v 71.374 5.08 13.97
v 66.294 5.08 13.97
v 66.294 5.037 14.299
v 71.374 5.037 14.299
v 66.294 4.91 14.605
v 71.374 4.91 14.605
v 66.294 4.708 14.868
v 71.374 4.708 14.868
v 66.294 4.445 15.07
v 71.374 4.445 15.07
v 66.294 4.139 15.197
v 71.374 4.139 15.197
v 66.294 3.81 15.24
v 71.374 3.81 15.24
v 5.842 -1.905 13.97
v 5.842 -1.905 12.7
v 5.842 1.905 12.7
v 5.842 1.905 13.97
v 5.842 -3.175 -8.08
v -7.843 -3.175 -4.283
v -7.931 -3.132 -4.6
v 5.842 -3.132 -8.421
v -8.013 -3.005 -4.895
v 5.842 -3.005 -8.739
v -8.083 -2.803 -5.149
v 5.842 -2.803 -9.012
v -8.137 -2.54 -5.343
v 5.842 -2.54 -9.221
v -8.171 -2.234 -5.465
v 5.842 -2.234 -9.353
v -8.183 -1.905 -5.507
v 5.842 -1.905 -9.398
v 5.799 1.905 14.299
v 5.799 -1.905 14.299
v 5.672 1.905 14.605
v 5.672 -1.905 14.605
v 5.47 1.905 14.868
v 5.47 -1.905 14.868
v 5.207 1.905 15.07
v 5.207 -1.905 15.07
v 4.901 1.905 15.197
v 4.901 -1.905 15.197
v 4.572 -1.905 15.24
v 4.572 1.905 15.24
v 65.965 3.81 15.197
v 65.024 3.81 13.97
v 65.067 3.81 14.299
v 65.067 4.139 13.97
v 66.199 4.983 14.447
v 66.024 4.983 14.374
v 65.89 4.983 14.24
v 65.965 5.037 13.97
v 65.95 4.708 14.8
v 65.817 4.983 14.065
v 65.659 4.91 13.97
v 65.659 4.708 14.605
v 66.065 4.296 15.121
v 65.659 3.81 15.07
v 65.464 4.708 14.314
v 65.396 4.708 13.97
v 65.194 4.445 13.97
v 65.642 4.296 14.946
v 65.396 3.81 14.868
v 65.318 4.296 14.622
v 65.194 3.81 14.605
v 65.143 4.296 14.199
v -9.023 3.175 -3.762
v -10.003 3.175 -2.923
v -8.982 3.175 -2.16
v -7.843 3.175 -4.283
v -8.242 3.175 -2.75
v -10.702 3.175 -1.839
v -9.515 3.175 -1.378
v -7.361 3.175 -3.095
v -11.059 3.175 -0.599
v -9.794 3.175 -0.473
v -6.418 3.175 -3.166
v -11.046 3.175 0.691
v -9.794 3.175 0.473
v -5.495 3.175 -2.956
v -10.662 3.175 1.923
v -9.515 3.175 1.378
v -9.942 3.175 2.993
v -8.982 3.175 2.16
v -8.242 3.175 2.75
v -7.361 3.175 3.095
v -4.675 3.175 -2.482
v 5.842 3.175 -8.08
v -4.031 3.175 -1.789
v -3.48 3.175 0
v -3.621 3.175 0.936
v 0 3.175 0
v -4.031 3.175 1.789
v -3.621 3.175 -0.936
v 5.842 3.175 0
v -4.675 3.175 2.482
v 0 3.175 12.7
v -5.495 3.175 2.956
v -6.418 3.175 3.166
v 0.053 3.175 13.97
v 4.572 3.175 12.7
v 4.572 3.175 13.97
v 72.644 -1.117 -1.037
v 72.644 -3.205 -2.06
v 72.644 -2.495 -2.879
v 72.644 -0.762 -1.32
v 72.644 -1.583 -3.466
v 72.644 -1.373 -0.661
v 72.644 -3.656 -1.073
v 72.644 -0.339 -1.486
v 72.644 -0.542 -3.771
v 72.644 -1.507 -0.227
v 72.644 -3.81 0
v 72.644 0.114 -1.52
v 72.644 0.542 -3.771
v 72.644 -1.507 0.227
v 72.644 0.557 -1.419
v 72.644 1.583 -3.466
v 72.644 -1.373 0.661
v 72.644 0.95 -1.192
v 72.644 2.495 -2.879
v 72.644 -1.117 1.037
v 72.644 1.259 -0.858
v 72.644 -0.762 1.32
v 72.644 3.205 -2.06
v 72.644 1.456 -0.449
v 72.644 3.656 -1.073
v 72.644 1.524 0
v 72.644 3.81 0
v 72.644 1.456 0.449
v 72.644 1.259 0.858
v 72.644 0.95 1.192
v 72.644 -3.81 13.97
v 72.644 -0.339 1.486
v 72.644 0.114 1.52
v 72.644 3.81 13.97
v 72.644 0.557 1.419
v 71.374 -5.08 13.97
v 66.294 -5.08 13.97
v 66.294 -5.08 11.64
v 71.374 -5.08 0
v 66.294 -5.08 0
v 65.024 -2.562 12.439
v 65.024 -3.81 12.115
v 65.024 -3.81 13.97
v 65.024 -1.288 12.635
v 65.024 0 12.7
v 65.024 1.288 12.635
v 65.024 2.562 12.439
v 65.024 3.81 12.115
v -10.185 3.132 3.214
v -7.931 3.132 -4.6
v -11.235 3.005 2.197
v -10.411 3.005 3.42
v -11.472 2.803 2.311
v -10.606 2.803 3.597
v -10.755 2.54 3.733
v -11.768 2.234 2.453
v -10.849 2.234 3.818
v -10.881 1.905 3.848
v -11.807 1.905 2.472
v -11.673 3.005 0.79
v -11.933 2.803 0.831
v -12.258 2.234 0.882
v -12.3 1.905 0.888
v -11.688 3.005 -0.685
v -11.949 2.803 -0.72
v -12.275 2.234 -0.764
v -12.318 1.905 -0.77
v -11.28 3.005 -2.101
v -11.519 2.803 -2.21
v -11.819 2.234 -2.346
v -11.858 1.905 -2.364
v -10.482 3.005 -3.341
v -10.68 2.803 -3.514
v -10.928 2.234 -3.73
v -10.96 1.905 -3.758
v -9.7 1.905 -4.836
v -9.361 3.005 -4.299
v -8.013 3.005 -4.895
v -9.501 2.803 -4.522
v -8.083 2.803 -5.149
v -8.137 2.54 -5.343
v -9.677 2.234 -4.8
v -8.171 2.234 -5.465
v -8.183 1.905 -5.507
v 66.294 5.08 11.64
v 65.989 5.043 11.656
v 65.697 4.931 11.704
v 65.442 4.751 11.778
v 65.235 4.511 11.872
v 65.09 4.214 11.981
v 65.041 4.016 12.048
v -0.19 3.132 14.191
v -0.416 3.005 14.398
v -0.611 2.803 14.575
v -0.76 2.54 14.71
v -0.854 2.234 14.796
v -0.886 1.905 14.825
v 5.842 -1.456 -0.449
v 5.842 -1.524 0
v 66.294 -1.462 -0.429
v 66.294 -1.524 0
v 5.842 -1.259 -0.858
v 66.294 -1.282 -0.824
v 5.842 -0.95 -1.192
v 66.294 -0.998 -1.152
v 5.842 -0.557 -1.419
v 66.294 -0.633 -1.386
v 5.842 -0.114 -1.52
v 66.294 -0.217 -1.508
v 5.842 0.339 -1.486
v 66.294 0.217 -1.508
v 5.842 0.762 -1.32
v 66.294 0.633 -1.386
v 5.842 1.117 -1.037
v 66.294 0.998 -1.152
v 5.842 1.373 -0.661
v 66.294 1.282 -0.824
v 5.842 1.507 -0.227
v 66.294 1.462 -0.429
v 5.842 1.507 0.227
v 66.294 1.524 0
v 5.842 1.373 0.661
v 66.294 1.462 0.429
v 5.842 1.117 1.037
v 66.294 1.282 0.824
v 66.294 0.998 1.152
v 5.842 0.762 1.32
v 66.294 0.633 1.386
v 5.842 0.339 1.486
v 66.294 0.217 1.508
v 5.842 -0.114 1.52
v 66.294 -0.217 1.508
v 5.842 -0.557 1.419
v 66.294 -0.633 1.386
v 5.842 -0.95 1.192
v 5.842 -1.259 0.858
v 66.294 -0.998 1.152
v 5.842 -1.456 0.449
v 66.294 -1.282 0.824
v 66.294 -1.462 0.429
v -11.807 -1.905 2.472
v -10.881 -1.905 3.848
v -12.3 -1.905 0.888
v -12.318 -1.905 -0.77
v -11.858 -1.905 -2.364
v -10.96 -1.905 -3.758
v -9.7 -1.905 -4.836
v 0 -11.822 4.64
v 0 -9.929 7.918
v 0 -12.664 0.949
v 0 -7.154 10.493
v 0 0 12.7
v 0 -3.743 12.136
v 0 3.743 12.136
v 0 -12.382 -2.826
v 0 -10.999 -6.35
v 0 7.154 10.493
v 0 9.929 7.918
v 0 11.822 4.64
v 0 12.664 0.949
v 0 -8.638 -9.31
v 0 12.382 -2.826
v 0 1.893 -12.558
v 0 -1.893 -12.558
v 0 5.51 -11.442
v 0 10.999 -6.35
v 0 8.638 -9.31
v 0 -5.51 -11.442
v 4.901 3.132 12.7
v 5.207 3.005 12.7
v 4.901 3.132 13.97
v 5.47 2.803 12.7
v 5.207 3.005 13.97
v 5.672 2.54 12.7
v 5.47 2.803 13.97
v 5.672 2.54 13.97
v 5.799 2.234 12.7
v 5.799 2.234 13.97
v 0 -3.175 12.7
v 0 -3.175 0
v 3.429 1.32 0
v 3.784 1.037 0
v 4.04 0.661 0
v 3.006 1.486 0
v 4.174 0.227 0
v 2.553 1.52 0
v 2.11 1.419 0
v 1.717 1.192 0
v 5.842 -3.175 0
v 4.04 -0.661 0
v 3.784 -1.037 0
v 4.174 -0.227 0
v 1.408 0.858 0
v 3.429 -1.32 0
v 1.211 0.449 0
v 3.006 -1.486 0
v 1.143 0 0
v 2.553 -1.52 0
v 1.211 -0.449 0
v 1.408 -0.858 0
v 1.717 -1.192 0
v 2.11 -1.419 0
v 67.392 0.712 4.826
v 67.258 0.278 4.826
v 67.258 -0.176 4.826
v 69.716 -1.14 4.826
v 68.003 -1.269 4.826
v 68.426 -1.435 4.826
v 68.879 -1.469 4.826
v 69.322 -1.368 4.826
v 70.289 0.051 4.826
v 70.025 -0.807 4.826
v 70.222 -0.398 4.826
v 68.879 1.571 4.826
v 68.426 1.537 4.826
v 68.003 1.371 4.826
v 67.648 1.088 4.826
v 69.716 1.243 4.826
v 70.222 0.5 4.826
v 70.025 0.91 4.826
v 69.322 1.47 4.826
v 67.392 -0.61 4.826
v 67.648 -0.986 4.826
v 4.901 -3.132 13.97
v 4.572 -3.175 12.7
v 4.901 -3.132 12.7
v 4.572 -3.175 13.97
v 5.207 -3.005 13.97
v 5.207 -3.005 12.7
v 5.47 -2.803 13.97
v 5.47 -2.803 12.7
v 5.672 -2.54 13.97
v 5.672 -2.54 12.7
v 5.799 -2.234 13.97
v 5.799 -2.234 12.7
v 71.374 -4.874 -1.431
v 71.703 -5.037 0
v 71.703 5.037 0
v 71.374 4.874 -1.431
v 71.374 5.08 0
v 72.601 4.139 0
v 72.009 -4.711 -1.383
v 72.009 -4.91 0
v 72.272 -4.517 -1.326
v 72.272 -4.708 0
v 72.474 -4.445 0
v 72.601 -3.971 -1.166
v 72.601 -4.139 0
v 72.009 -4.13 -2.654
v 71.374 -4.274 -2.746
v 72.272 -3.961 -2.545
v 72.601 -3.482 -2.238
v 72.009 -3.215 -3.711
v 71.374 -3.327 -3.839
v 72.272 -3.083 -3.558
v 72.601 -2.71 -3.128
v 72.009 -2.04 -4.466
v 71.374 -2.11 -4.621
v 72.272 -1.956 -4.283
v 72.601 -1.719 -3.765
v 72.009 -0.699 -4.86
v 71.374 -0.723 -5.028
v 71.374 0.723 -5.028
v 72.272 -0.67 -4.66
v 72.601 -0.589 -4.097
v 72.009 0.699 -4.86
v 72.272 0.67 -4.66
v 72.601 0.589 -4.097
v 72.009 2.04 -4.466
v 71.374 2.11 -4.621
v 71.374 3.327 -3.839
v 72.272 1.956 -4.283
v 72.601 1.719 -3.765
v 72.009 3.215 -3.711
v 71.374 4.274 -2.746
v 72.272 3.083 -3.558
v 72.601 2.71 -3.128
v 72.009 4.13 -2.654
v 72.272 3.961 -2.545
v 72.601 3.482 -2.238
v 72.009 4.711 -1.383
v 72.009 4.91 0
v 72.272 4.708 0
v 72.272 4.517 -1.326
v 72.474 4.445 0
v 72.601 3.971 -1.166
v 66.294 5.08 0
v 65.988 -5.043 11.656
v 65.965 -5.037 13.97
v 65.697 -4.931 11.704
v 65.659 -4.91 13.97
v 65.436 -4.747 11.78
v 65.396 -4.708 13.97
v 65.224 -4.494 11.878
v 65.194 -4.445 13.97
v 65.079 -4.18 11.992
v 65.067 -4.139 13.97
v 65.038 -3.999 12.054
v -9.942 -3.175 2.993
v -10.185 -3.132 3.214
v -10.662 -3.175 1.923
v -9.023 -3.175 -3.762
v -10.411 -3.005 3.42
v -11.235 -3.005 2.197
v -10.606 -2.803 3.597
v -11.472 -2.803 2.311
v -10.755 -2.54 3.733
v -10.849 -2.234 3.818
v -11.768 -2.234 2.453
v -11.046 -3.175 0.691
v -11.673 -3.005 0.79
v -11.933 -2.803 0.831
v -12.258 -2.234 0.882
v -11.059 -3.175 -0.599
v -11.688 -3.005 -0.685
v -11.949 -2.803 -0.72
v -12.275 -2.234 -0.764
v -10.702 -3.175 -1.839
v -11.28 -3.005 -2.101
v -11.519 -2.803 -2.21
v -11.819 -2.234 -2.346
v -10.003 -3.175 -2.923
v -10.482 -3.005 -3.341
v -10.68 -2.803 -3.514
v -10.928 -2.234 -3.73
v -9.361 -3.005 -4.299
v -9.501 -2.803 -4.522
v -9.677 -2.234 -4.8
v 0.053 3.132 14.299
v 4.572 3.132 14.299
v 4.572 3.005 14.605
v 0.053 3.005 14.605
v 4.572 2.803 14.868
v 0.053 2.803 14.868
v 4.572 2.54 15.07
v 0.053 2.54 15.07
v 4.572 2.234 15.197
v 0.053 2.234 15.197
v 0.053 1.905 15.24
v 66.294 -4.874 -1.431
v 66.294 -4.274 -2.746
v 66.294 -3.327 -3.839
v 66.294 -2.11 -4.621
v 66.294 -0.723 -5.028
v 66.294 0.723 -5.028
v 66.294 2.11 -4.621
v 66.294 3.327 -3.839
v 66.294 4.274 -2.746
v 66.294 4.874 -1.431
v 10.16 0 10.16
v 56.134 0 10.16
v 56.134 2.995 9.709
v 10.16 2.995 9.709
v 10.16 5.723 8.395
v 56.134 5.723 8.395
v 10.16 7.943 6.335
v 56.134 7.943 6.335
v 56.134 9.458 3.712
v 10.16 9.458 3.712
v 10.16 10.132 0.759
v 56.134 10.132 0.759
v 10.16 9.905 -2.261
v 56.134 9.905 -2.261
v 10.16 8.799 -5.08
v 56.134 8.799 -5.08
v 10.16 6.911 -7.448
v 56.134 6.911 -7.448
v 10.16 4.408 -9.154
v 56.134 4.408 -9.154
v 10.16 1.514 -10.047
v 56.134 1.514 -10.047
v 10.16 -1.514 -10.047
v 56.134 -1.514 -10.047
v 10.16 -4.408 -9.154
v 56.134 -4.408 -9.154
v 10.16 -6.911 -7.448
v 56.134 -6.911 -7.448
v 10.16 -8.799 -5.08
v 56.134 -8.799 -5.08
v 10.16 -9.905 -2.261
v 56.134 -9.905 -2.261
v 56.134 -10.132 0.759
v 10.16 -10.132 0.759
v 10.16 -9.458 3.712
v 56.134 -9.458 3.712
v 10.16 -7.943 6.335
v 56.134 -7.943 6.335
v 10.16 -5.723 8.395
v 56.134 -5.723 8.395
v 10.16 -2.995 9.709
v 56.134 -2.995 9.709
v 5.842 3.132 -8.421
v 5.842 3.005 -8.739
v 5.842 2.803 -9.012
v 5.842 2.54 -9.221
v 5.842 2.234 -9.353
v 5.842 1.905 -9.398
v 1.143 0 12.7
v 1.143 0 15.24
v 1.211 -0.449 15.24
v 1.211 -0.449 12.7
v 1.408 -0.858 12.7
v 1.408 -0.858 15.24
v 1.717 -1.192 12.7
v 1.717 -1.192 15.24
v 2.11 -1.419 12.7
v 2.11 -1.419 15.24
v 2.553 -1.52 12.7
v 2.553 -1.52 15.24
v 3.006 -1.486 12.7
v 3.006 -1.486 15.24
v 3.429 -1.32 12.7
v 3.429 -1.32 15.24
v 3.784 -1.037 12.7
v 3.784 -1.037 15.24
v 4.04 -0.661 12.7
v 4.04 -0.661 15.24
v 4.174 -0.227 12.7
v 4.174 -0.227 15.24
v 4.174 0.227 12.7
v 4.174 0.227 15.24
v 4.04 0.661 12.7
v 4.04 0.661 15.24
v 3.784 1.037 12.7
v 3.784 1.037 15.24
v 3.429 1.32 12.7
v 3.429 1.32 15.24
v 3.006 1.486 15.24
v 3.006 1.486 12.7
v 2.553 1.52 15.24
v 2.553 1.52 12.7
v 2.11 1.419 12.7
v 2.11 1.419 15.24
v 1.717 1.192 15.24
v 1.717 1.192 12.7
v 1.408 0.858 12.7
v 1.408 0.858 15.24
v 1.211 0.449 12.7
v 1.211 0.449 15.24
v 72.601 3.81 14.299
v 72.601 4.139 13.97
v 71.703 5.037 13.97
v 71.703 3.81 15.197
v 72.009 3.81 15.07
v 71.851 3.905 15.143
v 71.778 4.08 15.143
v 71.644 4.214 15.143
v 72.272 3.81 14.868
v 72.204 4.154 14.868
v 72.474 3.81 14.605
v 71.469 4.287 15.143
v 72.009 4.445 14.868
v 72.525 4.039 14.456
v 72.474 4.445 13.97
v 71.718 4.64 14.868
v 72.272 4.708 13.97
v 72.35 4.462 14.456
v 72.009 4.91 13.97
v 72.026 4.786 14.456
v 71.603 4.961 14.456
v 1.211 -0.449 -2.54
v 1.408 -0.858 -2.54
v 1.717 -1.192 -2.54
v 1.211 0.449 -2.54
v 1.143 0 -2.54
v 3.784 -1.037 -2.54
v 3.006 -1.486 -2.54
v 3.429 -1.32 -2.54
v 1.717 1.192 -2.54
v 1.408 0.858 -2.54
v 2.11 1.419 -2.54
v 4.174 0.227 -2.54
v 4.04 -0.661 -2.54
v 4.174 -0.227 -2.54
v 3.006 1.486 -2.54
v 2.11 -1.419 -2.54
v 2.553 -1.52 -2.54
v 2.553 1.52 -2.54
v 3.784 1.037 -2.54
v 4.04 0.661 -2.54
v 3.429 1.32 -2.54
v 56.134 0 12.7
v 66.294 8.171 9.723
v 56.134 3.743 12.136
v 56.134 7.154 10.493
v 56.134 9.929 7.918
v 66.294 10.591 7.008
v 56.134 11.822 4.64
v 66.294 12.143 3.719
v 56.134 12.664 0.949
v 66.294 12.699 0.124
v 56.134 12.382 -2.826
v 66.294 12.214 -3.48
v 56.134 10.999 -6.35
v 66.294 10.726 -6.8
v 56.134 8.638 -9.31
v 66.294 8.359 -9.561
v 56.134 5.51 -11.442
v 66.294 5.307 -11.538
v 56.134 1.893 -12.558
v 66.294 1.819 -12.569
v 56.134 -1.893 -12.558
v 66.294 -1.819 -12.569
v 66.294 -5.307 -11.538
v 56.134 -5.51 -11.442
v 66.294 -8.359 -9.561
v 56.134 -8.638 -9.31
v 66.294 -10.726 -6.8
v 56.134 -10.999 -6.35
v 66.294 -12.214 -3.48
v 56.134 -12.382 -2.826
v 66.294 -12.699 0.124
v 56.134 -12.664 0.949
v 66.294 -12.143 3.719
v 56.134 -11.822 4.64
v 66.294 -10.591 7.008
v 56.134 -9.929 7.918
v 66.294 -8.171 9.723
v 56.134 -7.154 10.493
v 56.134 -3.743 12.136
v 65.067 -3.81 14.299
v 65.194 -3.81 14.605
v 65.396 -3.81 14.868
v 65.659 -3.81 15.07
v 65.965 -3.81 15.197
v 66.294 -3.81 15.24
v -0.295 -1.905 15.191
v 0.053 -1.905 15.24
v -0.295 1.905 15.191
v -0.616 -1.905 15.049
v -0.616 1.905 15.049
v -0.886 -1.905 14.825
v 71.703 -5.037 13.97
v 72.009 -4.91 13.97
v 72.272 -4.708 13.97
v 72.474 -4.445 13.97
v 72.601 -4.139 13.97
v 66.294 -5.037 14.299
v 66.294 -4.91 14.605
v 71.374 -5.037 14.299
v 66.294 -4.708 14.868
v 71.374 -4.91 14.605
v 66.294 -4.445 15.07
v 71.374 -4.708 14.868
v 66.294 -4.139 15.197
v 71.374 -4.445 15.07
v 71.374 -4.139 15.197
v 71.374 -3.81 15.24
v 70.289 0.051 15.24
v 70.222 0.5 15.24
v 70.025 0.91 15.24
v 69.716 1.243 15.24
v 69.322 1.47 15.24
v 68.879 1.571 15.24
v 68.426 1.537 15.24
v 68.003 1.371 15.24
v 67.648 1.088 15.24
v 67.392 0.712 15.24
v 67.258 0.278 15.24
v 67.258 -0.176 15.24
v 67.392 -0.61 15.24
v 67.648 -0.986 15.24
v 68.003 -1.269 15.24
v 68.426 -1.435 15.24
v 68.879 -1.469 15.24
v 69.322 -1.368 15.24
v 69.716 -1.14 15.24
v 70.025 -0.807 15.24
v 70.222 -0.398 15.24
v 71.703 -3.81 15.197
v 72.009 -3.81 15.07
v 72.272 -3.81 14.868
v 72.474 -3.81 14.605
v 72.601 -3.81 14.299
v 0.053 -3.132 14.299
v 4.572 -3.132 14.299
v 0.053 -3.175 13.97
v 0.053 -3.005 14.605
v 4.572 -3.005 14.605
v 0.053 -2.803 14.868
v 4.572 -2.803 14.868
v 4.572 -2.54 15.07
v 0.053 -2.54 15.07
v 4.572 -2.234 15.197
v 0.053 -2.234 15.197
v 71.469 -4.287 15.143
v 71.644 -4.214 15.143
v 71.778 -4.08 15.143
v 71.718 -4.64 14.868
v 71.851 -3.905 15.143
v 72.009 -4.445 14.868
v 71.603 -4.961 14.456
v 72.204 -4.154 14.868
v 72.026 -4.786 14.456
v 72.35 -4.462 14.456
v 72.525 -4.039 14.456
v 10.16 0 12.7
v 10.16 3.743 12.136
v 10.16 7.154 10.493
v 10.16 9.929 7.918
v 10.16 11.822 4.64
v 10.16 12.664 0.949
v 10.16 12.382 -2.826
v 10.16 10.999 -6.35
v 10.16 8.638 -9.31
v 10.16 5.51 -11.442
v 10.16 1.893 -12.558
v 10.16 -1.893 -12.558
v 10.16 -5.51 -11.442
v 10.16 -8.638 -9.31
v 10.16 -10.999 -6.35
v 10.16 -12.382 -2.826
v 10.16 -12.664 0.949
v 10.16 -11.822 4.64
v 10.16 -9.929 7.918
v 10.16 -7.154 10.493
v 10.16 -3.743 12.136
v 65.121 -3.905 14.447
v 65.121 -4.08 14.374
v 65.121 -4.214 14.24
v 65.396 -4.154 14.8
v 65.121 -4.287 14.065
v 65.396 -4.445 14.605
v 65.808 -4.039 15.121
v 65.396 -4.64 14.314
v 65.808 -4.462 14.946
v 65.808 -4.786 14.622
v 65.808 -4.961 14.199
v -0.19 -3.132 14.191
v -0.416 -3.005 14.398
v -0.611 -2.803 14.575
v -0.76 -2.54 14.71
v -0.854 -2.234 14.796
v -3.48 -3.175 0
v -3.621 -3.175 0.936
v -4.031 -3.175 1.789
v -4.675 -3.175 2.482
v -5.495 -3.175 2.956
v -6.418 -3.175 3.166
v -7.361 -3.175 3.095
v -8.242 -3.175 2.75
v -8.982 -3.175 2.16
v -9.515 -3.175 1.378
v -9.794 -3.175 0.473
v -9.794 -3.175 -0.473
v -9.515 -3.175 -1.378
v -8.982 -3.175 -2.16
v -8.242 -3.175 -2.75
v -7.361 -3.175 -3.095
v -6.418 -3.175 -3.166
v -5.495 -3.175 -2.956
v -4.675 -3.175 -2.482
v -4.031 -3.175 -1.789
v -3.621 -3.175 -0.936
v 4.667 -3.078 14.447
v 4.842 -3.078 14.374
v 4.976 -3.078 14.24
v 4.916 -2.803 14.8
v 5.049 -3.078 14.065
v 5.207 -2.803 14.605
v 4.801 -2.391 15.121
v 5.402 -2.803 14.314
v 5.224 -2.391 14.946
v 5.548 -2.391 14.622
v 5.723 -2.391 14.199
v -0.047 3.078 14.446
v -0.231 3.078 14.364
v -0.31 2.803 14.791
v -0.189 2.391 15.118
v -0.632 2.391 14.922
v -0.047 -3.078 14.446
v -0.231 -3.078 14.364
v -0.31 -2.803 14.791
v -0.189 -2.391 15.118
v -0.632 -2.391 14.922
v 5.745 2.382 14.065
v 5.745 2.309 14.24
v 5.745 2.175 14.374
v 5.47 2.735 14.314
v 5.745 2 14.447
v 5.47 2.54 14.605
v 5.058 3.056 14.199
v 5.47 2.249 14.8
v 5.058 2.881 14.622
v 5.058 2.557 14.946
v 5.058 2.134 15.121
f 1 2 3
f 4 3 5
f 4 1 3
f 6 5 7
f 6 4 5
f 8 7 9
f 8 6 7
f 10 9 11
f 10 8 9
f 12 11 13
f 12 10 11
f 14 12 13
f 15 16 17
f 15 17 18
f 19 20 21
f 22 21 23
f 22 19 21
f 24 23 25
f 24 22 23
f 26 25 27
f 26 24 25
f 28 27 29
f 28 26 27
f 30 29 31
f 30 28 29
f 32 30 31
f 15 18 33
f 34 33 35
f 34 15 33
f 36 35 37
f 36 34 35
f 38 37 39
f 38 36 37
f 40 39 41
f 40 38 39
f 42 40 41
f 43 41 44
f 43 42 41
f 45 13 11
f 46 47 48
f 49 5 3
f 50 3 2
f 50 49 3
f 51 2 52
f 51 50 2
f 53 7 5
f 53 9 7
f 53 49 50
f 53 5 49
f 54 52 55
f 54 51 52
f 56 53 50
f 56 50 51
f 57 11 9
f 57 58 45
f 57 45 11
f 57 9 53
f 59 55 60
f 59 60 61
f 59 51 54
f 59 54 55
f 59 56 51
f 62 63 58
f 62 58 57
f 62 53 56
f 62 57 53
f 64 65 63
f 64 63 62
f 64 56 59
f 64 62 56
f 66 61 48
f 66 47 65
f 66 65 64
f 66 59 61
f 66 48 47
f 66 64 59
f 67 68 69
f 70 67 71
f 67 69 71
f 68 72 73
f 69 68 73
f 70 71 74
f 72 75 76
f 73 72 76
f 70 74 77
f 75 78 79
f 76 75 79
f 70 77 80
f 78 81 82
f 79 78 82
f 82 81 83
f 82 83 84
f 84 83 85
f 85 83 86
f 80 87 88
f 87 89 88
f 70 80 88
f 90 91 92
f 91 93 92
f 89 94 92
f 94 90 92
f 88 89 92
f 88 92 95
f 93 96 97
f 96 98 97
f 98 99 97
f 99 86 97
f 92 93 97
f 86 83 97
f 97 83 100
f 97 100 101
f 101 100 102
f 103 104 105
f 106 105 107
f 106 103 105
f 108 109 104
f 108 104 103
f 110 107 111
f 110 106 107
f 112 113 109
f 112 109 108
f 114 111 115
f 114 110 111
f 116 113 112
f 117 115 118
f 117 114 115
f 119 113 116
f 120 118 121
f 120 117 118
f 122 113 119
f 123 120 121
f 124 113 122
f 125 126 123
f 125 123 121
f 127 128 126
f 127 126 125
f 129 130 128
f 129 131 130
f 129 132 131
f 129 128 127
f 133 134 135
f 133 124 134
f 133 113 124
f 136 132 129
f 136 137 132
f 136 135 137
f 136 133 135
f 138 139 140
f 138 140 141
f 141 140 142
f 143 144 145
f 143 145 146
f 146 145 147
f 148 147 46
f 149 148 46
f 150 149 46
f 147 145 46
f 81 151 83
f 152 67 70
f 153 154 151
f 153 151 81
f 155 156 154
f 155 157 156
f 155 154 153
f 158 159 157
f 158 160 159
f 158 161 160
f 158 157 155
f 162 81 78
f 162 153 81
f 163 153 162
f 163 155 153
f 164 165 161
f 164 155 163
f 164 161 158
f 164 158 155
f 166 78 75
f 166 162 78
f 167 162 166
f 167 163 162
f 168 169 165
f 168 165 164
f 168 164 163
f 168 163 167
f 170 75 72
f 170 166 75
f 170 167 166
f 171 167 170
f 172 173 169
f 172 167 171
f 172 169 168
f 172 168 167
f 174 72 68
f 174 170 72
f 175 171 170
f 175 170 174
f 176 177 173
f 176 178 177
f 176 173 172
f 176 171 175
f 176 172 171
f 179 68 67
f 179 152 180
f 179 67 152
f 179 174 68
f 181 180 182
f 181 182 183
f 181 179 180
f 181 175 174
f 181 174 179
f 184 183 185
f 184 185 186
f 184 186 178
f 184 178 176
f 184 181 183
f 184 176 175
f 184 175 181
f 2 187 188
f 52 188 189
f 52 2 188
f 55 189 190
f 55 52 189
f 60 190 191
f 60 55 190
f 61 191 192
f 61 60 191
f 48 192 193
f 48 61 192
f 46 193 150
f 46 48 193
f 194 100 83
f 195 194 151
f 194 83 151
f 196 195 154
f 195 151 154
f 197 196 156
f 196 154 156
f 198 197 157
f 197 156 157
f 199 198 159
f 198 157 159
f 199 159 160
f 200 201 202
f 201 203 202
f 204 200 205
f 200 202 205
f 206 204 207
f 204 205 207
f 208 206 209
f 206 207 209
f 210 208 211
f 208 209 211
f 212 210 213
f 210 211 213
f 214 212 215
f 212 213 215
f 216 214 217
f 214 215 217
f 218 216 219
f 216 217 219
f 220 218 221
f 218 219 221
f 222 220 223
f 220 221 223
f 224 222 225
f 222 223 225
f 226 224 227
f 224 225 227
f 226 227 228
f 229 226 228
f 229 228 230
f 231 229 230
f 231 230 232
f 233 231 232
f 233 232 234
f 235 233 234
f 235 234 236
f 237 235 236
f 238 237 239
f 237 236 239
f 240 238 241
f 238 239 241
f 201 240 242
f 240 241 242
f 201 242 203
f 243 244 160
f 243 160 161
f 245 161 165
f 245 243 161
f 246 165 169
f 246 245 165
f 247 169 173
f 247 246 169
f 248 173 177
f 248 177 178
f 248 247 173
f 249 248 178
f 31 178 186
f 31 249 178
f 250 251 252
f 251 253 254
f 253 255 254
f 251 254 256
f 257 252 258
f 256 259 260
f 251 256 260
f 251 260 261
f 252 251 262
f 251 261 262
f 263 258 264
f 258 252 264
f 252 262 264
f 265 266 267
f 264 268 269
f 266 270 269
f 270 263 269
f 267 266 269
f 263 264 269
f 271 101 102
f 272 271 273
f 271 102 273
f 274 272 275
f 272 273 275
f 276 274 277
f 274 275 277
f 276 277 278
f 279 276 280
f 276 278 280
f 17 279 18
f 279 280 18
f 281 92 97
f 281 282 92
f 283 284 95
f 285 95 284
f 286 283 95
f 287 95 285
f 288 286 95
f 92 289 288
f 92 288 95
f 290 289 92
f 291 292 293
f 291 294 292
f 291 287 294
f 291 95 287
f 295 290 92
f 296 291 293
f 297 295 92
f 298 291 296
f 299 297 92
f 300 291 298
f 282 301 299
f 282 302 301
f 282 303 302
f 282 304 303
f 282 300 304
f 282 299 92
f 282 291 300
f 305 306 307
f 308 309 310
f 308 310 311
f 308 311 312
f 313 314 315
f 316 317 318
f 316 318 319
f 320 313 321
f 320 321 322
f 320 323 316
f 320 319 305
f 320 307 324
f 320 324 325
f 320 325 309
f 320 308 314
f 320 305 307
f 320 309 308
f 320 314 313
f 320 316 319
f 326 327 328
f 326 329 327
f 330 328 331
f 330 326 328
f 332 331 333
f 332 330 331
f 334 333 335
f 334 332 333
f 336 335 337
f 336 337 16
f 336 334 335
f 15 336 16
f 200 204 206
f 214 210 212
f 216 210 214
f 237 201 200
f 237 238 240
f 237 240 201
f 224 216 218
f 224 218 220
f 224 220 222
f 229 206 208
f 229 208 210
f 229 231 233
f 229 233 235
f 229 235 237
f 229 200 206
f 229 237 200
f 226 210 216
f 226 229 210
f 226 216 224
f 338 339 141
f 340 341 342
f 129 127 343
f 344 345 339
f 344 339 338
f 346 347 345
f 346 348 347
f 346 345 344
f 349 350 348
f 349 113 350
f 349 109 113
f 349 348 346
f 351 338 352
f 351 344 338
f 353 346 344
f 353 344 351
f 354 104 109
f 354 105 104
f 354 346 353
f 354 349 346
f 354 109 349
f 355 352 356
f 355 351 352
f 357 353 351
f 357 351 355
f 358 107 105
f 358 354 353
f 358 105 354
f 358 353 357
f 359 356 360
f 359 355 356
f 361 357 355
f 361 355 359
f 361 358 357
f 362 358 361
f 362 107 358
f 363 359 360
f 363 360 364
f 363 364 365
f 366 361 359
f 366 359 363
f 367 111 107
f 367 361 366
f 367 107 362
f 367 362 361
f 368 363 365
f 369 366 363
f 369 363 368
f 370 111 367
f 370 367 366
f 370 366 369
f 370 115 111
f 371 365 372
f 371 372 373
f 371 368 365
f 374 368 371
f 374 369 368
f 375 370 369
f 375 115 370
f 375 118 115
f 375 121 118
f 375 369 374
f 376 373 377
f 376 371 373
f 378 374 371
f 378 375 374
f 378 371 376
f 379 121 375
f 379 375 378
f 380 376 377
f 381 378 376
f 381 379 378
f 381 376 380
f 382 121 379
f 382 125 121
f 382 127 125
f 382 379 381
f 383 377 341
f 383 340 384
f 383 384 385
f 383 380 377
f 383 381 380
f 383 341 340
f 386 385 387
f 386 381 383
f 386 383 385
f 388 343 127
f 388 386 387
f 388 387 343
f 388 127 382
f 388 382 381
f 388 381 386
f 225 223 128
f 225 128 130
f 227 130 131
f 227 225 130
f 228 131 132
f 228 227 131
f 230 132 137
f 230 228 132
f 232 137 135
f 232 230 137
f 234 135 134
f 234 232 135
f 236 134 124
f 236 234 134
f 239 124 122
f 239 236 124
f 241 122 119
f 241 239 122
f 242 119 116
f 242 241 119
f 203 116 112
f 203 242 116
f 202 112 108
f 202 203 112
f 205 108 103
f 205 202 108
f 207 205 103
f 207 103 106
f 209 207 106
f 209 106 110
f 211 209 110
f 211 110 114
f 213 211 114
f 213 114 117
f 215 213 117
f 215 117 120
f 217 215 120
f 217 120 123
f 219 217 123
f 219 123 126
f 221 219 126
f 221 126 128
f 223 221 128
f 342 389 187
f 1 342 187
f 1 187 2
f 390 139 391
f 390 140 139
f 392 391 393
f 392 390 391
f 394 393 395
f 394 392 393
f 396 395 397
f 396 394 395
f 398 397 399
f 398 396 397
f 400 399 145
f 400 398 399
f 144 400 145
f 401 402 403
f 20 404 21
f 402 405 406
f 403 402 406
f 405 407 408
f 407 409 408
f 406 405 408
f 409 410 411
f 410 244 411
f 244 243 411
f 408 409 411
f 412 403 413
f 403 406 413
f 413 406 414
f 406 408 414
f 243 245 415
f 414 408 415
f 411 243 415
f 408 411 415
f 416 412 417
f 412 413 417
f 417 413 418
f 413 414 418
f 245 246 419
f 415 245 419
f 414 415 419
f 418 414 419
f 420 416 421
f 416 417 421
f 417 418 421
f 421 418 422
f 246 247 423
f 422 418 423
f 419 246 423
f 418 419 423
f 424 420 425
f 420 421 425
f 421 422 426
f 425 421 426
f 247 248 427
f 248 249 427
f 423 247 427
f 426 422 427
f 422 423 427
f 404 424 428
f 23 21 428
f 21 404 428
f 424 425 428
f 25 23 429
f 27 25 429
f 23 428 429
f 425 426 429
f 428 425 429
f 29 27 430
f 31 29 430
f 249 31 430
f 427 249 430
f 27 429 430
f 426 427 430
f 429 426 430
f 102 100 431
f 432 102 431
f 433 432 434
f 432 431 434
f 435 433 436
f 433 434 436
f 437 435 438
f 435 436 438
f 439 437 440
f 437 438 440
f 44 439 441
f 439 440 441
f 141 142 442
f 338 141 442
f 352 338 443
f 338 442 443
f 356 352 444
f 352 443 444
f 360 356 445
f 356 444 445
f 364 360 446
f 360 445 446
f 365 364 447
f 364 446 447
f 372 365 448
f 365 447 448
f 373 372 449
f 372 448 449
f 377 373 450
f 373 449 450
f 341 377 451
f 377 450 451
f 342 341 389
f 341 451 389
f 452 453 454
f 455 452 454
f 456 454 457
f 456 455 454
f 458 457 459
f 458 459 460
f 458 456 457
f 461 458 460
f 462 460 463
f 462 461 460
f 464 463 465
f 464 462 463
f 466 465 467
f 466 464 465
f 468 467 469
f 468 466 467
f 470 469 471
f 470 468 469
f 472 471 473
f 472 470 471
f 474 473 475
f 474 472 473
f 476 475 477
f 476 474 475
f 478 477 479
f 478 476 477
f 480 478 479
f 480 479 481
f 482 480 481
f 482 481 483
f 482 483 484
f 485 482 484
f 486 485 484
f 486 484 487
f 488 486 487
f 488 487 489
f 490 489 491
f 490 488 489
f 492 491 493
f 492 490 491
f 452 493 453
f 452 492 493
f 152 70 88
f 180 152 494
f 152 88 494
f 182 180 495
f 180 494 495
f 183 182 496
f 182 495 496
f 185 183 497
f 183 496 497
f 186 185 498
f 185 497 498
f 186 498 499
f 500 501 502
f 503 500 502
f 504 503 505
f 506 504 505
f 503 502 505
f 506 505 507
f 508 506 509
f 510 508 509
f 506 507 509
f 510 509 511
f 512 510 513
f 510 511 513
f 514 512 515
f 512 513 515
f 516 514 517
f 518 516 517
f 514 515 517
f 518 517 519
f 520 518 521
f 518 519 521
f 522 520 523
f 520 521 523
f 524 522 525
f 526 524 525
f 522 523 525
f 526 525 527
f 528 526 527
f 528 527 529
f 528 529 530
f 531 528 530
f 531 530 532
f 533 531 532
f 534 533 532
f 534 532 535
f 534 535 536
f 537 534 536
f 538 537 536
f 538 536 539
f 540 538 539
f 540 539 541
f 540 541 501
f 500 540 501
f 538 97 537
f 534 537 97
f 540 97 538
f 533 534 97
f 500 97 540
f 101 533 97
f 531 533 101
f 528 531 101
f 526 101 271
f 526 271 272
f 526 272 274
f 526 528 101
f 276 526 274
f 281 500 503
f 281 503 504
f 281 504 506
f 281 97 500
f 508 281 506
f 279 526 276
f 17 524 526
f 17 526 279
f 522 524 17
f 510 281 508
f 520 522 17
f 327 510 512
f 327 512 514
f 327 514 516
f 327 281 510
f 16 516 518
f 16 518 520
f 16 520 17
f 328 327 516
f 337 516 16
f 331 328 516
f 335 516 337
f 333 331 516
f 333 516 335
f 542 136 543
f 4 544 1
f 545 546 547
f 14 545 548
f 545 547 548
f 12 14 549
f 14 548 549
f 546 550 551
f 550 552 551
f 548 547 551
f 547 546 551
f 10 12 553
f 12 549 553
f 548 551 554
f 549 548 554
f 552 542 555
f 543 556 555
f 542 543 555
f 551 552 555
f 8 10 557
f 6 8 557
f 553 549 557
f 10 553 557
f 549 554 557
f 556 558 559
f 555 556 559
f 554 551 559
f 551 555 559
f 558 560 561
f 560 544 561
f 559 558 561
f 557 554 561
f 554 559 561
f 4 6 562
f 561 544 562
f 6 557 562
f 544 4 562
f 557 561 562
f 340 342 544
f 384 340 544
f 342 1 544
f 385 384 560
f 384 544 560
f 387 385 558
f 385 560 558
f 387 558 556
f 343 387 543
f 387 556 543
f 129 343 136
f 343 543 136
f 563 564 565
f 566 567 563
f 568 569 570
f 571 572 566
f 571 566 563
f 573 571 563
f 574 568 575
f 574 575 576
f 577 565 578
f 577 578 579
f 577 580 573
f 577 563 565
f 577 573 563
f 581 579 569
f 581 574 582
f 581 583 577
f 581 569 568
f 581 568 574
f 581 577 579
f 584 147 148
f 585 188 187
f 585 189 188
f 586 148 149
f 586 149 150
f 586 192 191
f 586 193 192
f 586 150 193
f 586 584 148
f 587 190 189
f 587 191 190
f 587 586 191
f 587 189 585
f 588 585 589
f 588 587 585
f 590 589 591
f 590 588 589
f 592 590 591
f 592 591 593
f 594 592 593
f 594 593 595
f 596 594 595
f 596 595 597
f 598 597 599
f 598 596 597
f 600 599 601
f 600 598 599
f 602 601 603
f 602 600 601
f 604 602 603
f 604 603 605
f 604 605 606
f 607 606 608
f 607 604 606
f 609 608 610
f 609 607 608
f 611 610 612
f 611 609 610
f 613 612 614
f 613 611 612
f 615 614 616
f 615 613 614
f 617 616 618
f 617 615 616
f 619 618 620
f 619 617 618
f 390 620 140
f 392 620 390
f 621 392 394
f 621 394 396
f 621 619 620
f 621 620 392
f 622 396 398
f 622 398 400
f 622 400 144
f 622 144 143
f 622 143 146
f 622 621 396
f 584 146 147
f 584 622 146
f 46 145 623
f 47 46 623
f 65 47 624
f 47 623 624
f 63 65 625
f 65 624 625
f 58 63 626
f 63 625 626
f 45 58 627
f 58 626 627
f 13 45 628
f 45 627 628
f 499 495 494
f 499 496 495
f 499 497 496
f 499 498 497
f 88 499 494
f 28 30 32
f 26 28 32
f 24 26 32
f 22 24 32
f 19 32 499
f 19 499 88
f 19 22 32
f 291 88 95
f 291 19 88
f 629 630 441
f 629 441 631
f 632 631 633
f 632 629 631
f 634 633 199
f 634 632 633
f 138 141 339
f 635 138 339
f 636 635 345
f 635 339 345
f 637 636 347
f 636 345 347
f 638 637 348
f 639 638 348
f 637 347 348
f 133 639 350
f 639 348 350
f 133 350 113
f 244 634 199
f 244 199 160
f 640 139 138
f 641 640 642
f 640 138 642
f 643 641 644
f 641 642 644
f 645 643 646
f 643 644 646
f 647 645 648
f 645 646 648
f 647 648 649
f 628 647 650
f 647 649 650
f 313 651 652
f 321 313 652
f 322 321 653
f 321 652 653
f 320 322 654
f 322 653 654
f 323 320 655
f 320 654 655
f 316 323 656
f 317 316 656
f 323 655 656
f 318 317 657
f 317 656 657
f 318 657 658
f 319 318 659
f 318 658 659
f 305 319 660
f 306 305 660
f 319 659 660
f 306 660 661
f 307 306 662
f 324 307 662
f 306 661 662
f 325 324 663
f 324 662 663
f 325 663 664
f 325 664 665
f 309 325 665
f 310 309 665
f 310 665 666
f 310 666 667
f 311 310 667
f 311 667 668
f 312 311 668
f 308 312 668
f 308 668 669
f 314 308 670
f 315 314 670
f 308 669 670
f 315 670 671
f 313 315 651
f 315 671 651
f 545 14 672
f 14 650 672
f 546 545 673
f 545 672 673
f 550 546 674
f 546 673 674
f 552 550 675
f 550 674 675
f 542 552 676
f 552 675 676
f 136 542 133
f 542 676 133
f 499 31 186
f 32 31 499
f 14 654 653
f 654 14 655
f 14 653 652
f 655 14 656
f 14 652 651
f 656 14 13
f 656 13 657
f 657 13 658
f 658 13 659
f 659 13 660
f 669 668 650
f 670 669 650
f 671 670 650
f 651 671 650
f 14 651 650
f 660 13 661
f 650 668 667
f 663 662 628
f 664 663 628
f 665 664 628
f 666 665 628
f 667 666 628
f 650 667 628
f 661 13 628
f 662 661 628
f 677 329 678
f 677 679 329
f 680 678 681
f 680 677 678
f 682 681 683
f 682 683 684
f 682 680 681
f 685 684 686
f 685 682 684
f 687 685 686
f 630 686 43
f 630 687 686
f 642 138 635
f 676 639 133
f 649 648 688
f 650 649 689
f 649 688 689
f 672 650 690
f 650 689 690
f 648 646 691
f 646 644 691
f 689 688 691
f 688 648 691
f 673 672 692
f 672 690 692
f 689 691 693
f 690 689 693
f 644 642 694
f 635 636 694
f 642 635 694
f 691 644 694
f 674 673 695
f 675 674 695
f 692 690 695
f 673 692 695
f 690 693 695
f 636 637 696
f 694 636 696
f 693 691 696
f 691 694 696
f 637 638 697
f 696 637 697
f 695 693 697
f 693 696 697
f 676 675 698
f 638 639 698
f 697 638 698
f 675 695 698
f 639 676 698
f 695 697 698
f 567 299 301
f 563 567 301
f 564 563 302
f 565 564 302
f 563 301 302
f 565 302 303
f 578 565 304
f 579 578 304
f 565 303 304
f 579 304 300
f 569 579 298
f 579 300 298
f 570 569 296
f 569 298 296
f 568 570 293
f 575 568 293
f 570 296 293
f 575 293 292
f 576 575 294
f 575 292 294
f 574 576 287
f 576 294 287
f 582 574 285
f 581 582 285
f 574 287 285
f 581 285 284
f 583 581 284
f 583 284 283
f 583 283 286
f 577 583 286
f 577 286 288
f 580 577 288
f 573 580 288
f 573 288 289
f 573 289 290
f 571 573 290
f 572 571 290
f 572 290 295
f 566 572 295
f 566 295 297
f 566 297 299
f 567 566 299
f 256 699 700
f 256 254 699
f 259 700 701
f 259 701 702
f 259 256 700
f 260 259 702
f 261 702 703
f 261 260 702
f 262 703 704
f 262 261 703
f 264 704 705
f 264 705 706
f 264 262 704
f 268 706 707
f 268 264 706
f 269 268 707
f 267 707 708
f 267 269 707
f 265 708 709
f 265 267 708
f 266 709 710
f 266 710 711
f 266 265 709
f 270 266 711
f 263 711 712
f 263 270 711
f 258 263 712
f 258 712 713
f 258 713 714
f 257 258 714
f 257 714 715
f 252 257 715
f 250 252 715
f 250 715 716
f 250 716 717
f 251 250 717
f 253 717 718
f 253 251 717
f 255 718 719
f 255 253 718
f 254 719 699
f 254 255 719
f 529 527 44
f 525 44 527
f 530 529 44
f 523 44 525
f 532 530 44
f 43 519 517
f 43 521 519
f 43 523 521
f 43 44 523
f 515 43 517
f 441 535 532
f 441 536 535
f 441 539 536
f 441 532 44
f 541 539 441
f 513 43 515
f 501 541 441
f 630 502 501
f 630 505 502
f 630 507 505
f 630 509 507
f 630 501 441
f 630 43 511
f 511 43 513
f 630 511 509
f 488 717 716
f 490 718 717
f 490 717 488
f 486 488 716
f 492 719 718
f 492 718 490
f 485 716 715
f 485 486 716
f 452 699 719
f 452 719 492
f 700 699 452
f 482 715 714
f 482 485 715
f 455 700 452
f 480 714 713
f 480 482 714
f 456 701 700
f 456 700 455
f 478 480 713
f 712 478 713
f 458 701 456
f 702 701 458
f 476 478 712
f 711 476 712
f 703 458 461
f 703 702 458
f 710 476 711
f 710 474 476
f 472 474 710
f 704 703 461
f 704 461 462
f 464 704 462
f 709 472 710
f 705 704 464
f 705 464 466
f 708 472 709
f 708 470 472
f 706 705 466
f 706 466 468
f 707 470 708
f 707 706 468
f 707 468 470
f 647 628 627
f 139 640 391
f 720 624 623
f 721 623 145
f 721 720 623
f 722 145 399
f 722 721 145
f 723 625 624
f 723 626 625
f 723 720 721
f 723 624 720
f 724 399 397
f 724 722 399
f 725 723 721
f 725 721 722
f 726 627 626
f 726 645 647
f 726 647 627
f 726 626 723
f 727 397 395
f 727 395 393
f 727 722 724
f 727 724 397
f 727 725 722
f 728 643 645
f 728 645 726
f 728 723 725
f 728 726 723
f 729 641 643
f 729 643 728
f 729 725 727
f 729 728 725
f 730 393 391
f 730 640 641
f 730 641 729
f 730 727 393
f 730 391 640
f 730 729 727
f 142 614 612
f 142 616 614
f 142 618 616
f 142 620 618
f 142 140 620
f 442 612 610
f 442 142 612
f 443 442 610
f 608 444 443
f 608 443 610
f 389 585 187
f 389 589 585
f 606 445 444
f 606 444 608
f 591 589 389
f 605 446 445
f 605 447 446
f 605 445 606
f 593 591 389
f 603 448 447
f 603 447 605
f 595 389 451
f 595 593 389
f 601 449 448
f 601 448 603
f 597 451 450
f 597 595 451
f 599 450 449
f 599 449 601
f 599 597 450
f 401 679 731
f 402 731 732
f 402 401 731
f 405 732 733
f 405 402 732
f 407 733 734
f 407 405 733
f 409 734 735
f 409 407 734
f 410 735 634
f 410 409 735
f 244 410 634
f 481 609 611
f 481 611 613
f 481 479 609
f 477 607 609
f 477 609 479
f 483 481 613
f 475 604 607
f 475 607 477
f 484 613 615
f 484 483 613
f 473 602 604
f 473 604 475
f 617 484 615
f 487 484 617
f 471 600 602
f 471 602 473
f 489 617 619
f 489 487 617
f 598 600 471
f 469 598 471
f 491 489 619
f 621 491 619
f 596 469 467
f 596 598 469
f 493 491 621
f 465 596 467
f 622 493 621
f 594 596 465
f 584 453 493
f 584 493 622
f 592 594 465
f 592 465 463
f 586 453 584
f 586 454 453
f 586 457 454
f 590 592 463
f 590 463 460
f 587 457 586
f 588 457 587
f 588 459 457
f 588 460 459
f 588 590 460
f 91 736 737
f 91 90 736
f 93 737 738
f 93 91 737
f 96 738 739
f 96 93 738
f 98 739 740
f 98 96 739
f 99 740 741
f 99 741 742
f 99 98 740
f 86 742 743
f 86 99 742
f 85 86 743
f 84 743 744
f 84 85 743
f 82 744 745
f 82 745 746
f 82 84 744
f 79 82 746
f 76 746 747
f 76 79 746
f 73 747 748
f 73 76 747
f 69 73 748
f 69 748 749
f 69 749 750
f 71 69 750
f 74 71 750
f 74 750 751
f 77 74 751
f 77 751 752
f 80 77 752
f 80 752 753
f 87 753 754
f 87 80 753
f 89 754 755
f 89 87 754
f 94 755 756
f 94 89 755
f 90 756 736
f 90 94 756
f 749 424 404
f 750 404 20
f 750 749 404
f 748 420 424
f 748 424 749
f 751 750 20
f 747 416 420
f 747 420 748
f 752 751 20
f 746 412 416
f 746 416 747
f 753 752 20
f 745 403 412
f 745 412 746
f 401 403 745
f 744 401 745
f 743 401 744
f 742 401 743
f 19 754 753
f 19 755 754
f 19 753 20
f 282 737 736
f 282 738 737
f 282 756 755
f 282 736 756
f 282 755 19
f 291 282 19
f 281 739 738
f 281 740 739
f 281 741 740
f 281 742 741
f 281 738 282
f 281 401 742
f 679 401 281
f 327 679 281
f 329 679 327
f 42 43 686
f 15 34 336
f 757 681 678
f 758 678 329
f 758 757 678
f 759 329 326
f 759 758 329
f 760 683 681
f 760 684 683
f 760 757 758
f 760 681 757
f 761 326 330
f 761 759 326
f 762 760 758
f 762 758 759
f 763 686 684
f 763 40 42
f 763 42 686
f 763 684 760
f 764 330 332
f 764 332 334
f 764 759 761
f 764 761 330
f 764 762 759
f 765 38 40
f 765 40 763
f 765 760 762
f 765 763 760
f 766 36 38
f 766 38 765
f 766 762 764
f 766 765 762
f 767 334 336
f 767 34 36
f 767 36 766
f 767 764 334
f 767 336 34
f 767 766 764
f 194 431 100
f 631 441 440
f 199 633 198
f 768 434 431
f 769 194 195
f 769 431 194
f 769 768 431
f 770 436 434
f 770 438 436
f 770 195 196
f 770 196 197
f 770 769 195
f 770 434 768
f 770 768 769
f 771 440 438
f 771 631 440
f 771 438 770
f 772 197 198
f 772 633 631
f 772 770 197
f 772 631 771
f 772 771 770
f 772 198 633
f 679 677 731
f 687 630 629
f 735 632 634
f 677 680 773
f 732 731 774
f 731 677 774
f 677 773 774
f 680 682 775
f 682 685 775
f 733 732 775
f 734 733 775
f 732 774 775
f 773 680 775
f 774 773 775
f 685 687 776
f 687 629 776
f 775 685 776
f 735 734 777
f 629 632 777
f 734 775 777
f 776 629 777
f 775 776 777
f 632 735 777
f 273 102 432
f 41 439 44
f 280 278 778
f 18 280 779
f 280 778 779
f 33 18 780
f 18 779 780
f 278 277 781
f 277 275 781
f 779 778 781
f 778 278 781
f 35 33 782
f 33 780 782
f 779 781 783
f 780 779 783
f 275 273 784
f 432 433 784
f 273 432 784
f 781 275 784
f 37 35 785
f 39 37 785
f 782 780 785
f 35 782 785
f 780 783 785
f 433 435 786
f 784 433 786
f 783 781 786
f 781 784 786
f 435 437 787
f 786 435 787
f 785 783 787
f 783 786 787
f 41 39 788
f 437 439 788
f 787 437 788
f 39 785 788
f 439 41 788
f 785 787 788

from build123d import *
from build123d import SkipClean  # not in build123d's __all__

# Parameters (mm, degrees)
F0_W      = 5.842
F0_H      = 12.7
F0_R      = 3.175
F2_DEPTH  = 3.175
F4_DEPTH  = 60.452
F5_R      = 1.524
F6_DEPTH  = 1.27
F7_DEPTH  = 6.35
F10_DEPTH = 17.78
F11_R     = 1.524
F12_DEPTH = 10.414
F13_R     = 1.27
F14_R     = 1.27


# Not quite as in the source:
# - after a boolean that leaves OpenCascade's solid faulty, fix() repairs it


with BuildPart() as f1:
    # F0 (on Front) → F1 (revolve)
    with BuildSketch(Plane.XZ):
        Polygon((5.842, 12.7), (5.842, 0), (66.294, 0), (66.294, 12.7), (56.134, 12.7), (56.134, 10.16), (10.16, 10.16), (10.16, 12.7), align=None)
        with Locations((2.921, 6.35)):
            Rectangle(F0_W, F0_H)
    revolve(axis=Axis((33.147, 0, 0), (-1, 0, 0)))

    # F3 (on face) → F4 (cut)
    with BuildSketch(Plane.YZ.offset(66.294)):
        with BuildLine():
            Line((-1.524, 0), (1.524, 0))
            ThreePointArc((1.524, 0), (0, 1.524), (-1.524, 0))
        make_face()
        with BuildLine():
            ThreePointArc((-1.524, 0), (0, -1.524), (1.524, 0))
            Line((1.524, 0), (-1.524, 0))
        make_face()
    extrude(amount=-F4_DEPTH, mode=Mode.SUBTRACT)

    # F5 (on face) → F6 (join)
    with BuildSketch(Plane.YZ.offset(66.294)):
        with BuildLine():
            ThreePointArc((-5.08, 0), (0, 5.08), (5.08, 0))
            Line((5.08, 0), (5.08, 11.6397422652))
            ThreePointArc((5.08, 11.6397422652), (0, 12.7), (-5.08, 11.6397422652))
            Line((-5.08, 11.6397422652), (-5.08, 0))
        make_face()
        with BuildLine():
            ThreePointArc((-5.08, 11.6397422652), (0, 12.7), (5.08, 11.6397422652))
            Line((5.08, 11.6397422652), (5.08, 15.24))
            Line((5.08, 15.24), (-5.08, 15.24))
            Line((-5.08, 15.24), (-5.08, 11.6397422652))
        make_face()
        with BuildLine():
            ThreePointArc((-5.08, 0), (0, -5.08), (5.08, 0))
            ThreePointArc((5.08, 0), (0, 5.08), (-5.08, 0))
        make_face()
        Circle(F5_R, mode=Mode.SUBTRACT)
    extrude(amount=-F6_DEPTH)

    # F5 (on face) → F7 (join)
    with BuildSketch(Plane.YZ.offset(66.294)):
        with BuildLine():
            ThreePointArc((-5.08, 0), (0, 5.08), (5.08, 0))
            Line((5.08, 0), (5.08, 11.6397422652))
            ThreePointArc((5.08, 11.6397422652), (0, 12.7), (-5.08, 11.6397422652))
            Line((-5.08, 11.6397422652), (-5.08, 0))
        make_face()
        with BuildLine():
            ThreePointArc((-5.08, 11.6397422652), (0, 12.7), (5.08, 11.6397422652))
            Line((5.08, 11.6397422652), (5.08, 15.24))
            Line((5.08, 15.24), (-5.08, 15.24))
            Line((-5.08, 15.24), (-5.08, 11.6397422652))
        make_face()
        with BuildLine():
            ThreePointArc((-5.08, 0), (0, -5.08), (5.08, 0))
            ThreePointArc((5.08, 0), (0, 5.08), (-5.08, 0))
        make_face()
        Circle(F5_R, mode=Mode.SUBTRACT)
    with SkipClean():  # cleaning this boolean's faces spoils the solid; the shape is the same uncleaned
        extrude(amount=F7_DEPTH)

    # F11 (on face) → F12 (cut)
    with BuildSketch(Plane.XY.offset(15.24)):
        with Locations((68.7653996064, 0.0510123878)):
            Circle(F11_R)
    extrude(amount=-F12_DEPTH, mode=Mode.SUBTRACT)

    add(f1.part.fix(), mode=Mode.REPLACE)

    # F13
    f13_edges = [f1.edges().sort_by_distance(p)[0] for p in [
        (72.644, -5.08, 7.62),
        (68.834, -5.08, 15.24),
        (72.644, 0, 15.24),
        (65.024, 0, 15.24),
        (68.834, 5.08, 15.24),
        (65.024, -5.08, 13.439871),
        (65.024, 5.08, 13.439871),
    ]]
    fillet(f13_edges, radius=F13_R)


with BuildPart() as f2:
    # F0 (on Front) → F2 (new body, symmetric)
    with BuildSketch(Plane.XZ):
        with BuildLine():
            Line((-0.9398, 0), (0, 0))
            Line((0, 0), (0, 12.7))
            Line((0, 12.7), (5.842, 12.7))
            Line((5.842, 12.7), (5.842, 15.24))
            Line((5.842, 15.24), (-0.508, 15.24))
            Line((-0.508, 15.24), (-10.8806298187, 3.8475430269))
            ThreePointArc((-10.8806298187, 3.8475430269), (-4.5919612295, 5.3297205562), (-0.9398, 0))
        make_face()
        with BuildLine():
            ThreePointArc((-8.1826630726, -5.5069827884), (-3.1957909266, -4.5493385486), (-0.9398, 0))
            ThreePointArc((-0.9398, 0), (-4.5919612295, 5.3297205562), (-10.8806298187, 3.8475430269))
            ThreePointArc((-10.8806298187, 3.8475430269), (-12.1459778134, -1.5837270034), (-8.1826630726, -5.5069827884))
        make_face()
        with Locations((-6.6548, 0)):
            Circle(F0_R, mode=Mode.SUBTRACT)
        with BuildLine():
            Line((5.842, 0), (0, 0))
            Line((0, 0), (-0.9398, 0))
            ThreePointArc((-0.9398, 0), (-3.1957909266, -4.5493385486), (-8.1826630726, -5.5069827884))
            Line((-8.1826630726, -5.5069827884), (5.842, -9.398))
            Line((5.842, -9.398), (5.842, 0))
        make_face()
    extrude(amount=F2_DEPTH, both=True)

    # F9 (on face) → F10 (cut)
    with BuildSketch(Plane.XY.offset(15.24)):
        with BuildLine():
            ThreePointArc((4.191, 0), (2.667, 1.524), (1.143, 0))
            ThreePointArc((1.143, 0), (2.667, -1.524), (4.191, 0))
        make_face()
    extrude(amount=-F10_DEPTH, mode=Mode.SUBTRACT)

    # F14
    f14_edges = [f2.edges().sort_by_distance(p)[0] for p in [
        (-5.694315, -3.175, 9.543772),
        (-5.694315, 3.175, 9.543772),
        (-0.508, 0, 15.24),
        (2.667, 3.175, 15.24),
        (5.842, 3.175, 13.97),
        (5.842, 0, 15.24),
        (2.667, -3.175, 15.24),
        (5.842, -3.175, 13.97),
        (-12.145978, 3.175, -1.583727),
        (-1.170332, 3.175, -7.452491),
        (-12.145978, -3.175, -1.583727),
        (-1.170332, -3.175, -7.452491),
    ]]
    fillet(f14_edges, radius=F14_R)


solid = Compound([f1.part, f2.part])
